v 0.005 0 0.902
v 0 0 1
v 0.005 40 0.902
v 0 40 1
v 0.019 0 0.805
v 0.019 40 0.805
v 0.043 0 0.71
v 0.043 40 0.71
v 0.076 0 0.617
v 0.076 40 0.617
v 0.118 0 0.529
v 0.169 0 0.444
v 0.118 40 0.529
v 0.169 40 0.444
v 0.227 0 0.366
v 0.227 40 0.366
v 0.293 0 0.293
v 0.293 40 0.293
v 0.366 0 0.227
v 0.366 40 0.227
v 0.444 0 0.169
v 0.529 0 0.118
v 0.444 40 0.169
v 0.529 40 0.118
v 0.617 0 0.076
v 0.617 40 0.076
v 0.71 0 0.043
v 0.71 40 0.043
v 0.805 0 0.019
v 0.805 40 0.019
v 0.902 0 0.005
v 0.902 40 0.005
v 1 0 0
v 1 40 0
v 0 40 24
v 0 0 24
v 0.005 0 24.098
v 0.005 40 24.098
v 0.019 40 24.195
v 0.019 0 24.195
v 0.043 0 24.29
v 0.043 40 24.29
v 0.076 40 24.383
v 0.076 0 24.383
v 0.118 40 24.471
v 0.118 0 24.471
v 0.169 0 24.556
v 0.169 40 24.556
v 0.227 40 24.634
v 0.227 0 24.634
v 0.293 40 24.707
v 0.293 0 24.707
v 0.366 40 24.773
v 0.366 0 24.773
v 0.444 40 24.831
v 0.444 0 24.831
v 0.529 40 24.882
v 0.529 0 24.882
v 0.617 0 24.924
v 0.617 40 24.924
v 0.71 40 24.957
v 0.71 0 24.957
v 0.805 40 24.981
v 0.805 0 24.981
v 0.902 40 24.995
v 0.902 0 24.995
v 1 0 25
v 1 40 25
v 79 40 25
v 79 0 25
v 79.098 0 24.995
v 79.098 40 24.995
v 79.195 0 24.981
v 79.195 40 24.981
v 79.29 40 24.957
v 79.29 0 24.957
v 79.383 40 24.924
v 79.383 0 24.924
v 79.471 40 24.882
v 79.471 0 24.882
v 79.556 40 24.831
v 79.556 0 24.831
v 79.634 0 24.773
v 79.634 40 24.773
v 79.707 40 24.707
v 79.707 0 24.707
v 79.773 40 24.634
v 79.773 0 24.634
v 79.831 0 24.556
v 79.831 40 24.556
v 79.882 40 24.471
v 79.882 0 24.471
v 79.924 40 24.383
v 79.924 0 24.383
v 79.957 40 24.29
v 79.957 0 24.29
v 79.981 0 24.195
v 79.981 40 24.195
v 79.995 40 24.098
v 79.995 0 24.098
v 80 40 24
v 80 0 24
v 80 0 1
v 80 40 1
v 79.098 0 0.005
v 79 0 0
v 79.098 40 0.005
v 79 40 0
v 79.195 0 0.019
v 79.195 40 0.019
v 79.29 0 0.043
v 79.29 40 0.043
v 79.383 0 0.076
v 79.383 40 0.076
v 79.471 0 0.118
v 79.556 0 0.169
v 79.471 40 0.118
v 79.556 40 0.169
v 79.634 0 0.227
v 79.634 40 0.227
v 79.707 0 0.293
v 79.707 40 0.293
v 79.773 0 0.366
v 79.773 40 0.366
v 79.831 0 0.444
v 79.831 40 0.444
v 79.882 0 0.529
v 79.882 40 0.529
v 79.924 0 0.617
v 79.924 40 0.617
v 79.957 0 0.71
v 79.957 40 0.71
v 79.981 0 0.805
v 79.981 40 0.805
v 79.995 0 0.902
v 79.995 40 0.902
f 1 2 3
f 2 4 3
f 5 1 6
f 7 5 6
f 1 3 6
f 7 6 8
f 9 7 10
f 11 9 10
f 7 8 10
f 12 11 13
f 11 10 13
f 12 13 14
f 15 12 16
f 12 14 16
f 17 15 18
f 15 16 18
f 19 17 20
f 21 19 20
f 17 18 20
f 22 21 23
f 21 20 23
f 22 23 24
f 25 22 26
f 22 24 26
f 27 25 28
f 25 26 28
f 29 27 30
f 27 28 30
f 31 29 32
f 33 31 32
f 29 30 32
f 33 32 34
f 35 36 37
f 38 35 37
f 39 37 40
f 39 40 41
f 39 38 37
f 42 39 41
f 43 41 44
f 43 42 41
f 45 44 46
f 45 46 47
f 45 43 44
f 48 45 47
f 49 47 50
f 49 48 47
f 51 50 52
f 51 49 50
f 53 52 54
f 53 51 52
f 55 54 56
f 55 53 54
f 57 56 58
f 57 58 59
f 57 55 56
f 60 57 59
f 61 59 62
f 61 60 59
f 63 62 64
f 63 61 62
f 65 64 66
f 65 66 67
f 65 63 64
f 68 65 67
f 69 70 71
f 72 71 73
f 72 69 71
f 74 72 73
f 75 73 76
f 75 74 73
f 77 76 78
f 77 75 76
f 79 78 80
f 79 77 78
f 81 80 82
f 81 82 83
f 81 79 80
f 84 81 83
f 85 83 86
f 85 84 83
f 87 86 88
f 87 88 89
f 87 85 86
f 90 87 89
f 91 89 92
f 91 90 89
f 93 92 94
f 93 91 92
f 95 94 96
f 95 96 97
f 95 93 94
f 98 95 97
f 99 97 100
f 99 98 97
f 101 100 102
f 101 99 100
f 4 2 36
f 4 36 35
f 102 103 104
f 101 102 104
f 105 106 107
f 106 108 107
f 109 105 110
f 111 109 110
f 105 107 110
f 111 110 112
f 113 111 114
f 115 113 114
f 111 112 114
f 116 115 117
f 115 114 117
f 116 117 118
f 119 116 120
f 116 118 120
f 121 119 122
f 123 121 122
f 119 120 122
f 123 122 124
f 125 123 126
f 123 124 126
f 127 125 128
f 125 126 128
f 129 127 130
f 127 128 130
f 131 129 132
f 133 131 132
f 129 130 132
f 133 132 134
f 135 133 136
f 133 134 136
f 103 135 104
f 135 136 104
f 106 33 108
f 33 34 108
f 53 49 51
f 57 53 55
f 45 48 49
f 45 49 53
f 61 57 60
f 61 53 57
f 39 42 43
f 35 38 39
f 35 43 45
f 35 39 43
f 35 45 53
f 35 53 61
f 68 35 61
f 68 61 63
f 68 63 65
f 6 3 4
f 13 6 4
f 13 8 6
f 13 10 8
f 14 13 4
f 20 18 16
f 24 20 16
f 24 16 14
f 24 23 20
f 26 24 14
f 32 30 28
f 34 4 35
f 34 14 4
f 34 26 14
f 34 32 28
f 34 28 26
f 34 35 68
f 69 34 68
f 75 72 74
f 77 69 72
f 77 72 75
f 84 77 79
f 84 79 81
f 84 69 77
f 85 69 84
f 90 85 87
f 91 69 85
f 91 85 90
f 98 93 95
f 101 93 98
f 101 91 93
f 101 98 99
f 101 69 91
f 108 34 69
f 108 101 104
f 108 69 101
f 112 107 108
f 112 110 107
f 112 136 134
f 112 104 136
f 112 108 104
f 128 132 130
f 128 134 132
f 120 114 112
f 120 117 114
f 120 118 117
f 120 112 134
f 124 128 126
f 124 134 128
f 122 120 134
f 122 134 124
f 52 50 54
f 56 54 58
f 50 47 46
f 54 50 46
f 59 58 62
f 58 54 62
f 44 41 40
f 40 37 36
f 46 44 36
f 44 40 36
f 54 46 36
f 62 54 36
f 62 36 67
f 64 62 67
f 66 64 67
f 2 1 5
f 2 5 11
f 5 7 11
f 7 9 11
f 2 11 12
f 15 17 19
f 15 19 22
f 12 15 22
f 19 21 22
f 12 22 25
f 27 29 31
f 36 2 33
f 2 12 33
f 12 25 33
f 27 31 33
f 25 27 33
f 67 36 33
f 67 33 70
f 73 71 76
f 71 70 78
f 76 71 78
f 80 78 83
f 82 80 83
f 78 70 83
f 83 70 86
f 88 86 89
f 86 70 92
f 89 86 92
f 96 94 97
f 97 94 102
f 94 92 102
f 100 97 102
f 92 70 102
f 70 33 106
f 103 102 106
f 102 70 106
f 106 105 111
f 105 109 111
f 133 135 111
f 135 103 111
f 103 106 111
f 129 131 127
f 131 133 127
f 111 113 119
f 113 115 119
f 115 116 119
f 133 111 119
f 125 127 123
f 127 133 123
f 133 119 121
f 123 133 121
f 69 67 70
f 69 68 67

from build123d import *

# Parameters (mm, degrees)
SKETCH1_W           = 80
SKETCH1_H           = 40
BOSS_EXTRUDE1_DEPTH = 25
FILLET3_R           = 1
FILLET4_R           = 1


with BuildPart() as part:
    # Sketch1 → Boss-Extrude1 (new body)
    with BuildSketch(Plane.XY):
        with Locations((40, 20)):
            Rectangle(SKETCH1_W, SKETCH1_H)
    extrude(amount=BOSS_EXTRUDE1_DEPTH)

    # Fillet3
    fillet3_edges = [part.edges().sort_by_distance(p)[0] for p in [
        (0, 20, 25),
    ]]
    fillet(fillet3_edges, radius=FILLET3_R)

    # Fillet4
    fillet4_edges = [part.edges().sort_by_distance(p)[0] for p in [
        (80, 20, 25),
        (80, 20, 0),
        (0, 20, 0),
    ]]
    fillet(fillet4_edges, radius=FILLET4_R)


solid = part.part
